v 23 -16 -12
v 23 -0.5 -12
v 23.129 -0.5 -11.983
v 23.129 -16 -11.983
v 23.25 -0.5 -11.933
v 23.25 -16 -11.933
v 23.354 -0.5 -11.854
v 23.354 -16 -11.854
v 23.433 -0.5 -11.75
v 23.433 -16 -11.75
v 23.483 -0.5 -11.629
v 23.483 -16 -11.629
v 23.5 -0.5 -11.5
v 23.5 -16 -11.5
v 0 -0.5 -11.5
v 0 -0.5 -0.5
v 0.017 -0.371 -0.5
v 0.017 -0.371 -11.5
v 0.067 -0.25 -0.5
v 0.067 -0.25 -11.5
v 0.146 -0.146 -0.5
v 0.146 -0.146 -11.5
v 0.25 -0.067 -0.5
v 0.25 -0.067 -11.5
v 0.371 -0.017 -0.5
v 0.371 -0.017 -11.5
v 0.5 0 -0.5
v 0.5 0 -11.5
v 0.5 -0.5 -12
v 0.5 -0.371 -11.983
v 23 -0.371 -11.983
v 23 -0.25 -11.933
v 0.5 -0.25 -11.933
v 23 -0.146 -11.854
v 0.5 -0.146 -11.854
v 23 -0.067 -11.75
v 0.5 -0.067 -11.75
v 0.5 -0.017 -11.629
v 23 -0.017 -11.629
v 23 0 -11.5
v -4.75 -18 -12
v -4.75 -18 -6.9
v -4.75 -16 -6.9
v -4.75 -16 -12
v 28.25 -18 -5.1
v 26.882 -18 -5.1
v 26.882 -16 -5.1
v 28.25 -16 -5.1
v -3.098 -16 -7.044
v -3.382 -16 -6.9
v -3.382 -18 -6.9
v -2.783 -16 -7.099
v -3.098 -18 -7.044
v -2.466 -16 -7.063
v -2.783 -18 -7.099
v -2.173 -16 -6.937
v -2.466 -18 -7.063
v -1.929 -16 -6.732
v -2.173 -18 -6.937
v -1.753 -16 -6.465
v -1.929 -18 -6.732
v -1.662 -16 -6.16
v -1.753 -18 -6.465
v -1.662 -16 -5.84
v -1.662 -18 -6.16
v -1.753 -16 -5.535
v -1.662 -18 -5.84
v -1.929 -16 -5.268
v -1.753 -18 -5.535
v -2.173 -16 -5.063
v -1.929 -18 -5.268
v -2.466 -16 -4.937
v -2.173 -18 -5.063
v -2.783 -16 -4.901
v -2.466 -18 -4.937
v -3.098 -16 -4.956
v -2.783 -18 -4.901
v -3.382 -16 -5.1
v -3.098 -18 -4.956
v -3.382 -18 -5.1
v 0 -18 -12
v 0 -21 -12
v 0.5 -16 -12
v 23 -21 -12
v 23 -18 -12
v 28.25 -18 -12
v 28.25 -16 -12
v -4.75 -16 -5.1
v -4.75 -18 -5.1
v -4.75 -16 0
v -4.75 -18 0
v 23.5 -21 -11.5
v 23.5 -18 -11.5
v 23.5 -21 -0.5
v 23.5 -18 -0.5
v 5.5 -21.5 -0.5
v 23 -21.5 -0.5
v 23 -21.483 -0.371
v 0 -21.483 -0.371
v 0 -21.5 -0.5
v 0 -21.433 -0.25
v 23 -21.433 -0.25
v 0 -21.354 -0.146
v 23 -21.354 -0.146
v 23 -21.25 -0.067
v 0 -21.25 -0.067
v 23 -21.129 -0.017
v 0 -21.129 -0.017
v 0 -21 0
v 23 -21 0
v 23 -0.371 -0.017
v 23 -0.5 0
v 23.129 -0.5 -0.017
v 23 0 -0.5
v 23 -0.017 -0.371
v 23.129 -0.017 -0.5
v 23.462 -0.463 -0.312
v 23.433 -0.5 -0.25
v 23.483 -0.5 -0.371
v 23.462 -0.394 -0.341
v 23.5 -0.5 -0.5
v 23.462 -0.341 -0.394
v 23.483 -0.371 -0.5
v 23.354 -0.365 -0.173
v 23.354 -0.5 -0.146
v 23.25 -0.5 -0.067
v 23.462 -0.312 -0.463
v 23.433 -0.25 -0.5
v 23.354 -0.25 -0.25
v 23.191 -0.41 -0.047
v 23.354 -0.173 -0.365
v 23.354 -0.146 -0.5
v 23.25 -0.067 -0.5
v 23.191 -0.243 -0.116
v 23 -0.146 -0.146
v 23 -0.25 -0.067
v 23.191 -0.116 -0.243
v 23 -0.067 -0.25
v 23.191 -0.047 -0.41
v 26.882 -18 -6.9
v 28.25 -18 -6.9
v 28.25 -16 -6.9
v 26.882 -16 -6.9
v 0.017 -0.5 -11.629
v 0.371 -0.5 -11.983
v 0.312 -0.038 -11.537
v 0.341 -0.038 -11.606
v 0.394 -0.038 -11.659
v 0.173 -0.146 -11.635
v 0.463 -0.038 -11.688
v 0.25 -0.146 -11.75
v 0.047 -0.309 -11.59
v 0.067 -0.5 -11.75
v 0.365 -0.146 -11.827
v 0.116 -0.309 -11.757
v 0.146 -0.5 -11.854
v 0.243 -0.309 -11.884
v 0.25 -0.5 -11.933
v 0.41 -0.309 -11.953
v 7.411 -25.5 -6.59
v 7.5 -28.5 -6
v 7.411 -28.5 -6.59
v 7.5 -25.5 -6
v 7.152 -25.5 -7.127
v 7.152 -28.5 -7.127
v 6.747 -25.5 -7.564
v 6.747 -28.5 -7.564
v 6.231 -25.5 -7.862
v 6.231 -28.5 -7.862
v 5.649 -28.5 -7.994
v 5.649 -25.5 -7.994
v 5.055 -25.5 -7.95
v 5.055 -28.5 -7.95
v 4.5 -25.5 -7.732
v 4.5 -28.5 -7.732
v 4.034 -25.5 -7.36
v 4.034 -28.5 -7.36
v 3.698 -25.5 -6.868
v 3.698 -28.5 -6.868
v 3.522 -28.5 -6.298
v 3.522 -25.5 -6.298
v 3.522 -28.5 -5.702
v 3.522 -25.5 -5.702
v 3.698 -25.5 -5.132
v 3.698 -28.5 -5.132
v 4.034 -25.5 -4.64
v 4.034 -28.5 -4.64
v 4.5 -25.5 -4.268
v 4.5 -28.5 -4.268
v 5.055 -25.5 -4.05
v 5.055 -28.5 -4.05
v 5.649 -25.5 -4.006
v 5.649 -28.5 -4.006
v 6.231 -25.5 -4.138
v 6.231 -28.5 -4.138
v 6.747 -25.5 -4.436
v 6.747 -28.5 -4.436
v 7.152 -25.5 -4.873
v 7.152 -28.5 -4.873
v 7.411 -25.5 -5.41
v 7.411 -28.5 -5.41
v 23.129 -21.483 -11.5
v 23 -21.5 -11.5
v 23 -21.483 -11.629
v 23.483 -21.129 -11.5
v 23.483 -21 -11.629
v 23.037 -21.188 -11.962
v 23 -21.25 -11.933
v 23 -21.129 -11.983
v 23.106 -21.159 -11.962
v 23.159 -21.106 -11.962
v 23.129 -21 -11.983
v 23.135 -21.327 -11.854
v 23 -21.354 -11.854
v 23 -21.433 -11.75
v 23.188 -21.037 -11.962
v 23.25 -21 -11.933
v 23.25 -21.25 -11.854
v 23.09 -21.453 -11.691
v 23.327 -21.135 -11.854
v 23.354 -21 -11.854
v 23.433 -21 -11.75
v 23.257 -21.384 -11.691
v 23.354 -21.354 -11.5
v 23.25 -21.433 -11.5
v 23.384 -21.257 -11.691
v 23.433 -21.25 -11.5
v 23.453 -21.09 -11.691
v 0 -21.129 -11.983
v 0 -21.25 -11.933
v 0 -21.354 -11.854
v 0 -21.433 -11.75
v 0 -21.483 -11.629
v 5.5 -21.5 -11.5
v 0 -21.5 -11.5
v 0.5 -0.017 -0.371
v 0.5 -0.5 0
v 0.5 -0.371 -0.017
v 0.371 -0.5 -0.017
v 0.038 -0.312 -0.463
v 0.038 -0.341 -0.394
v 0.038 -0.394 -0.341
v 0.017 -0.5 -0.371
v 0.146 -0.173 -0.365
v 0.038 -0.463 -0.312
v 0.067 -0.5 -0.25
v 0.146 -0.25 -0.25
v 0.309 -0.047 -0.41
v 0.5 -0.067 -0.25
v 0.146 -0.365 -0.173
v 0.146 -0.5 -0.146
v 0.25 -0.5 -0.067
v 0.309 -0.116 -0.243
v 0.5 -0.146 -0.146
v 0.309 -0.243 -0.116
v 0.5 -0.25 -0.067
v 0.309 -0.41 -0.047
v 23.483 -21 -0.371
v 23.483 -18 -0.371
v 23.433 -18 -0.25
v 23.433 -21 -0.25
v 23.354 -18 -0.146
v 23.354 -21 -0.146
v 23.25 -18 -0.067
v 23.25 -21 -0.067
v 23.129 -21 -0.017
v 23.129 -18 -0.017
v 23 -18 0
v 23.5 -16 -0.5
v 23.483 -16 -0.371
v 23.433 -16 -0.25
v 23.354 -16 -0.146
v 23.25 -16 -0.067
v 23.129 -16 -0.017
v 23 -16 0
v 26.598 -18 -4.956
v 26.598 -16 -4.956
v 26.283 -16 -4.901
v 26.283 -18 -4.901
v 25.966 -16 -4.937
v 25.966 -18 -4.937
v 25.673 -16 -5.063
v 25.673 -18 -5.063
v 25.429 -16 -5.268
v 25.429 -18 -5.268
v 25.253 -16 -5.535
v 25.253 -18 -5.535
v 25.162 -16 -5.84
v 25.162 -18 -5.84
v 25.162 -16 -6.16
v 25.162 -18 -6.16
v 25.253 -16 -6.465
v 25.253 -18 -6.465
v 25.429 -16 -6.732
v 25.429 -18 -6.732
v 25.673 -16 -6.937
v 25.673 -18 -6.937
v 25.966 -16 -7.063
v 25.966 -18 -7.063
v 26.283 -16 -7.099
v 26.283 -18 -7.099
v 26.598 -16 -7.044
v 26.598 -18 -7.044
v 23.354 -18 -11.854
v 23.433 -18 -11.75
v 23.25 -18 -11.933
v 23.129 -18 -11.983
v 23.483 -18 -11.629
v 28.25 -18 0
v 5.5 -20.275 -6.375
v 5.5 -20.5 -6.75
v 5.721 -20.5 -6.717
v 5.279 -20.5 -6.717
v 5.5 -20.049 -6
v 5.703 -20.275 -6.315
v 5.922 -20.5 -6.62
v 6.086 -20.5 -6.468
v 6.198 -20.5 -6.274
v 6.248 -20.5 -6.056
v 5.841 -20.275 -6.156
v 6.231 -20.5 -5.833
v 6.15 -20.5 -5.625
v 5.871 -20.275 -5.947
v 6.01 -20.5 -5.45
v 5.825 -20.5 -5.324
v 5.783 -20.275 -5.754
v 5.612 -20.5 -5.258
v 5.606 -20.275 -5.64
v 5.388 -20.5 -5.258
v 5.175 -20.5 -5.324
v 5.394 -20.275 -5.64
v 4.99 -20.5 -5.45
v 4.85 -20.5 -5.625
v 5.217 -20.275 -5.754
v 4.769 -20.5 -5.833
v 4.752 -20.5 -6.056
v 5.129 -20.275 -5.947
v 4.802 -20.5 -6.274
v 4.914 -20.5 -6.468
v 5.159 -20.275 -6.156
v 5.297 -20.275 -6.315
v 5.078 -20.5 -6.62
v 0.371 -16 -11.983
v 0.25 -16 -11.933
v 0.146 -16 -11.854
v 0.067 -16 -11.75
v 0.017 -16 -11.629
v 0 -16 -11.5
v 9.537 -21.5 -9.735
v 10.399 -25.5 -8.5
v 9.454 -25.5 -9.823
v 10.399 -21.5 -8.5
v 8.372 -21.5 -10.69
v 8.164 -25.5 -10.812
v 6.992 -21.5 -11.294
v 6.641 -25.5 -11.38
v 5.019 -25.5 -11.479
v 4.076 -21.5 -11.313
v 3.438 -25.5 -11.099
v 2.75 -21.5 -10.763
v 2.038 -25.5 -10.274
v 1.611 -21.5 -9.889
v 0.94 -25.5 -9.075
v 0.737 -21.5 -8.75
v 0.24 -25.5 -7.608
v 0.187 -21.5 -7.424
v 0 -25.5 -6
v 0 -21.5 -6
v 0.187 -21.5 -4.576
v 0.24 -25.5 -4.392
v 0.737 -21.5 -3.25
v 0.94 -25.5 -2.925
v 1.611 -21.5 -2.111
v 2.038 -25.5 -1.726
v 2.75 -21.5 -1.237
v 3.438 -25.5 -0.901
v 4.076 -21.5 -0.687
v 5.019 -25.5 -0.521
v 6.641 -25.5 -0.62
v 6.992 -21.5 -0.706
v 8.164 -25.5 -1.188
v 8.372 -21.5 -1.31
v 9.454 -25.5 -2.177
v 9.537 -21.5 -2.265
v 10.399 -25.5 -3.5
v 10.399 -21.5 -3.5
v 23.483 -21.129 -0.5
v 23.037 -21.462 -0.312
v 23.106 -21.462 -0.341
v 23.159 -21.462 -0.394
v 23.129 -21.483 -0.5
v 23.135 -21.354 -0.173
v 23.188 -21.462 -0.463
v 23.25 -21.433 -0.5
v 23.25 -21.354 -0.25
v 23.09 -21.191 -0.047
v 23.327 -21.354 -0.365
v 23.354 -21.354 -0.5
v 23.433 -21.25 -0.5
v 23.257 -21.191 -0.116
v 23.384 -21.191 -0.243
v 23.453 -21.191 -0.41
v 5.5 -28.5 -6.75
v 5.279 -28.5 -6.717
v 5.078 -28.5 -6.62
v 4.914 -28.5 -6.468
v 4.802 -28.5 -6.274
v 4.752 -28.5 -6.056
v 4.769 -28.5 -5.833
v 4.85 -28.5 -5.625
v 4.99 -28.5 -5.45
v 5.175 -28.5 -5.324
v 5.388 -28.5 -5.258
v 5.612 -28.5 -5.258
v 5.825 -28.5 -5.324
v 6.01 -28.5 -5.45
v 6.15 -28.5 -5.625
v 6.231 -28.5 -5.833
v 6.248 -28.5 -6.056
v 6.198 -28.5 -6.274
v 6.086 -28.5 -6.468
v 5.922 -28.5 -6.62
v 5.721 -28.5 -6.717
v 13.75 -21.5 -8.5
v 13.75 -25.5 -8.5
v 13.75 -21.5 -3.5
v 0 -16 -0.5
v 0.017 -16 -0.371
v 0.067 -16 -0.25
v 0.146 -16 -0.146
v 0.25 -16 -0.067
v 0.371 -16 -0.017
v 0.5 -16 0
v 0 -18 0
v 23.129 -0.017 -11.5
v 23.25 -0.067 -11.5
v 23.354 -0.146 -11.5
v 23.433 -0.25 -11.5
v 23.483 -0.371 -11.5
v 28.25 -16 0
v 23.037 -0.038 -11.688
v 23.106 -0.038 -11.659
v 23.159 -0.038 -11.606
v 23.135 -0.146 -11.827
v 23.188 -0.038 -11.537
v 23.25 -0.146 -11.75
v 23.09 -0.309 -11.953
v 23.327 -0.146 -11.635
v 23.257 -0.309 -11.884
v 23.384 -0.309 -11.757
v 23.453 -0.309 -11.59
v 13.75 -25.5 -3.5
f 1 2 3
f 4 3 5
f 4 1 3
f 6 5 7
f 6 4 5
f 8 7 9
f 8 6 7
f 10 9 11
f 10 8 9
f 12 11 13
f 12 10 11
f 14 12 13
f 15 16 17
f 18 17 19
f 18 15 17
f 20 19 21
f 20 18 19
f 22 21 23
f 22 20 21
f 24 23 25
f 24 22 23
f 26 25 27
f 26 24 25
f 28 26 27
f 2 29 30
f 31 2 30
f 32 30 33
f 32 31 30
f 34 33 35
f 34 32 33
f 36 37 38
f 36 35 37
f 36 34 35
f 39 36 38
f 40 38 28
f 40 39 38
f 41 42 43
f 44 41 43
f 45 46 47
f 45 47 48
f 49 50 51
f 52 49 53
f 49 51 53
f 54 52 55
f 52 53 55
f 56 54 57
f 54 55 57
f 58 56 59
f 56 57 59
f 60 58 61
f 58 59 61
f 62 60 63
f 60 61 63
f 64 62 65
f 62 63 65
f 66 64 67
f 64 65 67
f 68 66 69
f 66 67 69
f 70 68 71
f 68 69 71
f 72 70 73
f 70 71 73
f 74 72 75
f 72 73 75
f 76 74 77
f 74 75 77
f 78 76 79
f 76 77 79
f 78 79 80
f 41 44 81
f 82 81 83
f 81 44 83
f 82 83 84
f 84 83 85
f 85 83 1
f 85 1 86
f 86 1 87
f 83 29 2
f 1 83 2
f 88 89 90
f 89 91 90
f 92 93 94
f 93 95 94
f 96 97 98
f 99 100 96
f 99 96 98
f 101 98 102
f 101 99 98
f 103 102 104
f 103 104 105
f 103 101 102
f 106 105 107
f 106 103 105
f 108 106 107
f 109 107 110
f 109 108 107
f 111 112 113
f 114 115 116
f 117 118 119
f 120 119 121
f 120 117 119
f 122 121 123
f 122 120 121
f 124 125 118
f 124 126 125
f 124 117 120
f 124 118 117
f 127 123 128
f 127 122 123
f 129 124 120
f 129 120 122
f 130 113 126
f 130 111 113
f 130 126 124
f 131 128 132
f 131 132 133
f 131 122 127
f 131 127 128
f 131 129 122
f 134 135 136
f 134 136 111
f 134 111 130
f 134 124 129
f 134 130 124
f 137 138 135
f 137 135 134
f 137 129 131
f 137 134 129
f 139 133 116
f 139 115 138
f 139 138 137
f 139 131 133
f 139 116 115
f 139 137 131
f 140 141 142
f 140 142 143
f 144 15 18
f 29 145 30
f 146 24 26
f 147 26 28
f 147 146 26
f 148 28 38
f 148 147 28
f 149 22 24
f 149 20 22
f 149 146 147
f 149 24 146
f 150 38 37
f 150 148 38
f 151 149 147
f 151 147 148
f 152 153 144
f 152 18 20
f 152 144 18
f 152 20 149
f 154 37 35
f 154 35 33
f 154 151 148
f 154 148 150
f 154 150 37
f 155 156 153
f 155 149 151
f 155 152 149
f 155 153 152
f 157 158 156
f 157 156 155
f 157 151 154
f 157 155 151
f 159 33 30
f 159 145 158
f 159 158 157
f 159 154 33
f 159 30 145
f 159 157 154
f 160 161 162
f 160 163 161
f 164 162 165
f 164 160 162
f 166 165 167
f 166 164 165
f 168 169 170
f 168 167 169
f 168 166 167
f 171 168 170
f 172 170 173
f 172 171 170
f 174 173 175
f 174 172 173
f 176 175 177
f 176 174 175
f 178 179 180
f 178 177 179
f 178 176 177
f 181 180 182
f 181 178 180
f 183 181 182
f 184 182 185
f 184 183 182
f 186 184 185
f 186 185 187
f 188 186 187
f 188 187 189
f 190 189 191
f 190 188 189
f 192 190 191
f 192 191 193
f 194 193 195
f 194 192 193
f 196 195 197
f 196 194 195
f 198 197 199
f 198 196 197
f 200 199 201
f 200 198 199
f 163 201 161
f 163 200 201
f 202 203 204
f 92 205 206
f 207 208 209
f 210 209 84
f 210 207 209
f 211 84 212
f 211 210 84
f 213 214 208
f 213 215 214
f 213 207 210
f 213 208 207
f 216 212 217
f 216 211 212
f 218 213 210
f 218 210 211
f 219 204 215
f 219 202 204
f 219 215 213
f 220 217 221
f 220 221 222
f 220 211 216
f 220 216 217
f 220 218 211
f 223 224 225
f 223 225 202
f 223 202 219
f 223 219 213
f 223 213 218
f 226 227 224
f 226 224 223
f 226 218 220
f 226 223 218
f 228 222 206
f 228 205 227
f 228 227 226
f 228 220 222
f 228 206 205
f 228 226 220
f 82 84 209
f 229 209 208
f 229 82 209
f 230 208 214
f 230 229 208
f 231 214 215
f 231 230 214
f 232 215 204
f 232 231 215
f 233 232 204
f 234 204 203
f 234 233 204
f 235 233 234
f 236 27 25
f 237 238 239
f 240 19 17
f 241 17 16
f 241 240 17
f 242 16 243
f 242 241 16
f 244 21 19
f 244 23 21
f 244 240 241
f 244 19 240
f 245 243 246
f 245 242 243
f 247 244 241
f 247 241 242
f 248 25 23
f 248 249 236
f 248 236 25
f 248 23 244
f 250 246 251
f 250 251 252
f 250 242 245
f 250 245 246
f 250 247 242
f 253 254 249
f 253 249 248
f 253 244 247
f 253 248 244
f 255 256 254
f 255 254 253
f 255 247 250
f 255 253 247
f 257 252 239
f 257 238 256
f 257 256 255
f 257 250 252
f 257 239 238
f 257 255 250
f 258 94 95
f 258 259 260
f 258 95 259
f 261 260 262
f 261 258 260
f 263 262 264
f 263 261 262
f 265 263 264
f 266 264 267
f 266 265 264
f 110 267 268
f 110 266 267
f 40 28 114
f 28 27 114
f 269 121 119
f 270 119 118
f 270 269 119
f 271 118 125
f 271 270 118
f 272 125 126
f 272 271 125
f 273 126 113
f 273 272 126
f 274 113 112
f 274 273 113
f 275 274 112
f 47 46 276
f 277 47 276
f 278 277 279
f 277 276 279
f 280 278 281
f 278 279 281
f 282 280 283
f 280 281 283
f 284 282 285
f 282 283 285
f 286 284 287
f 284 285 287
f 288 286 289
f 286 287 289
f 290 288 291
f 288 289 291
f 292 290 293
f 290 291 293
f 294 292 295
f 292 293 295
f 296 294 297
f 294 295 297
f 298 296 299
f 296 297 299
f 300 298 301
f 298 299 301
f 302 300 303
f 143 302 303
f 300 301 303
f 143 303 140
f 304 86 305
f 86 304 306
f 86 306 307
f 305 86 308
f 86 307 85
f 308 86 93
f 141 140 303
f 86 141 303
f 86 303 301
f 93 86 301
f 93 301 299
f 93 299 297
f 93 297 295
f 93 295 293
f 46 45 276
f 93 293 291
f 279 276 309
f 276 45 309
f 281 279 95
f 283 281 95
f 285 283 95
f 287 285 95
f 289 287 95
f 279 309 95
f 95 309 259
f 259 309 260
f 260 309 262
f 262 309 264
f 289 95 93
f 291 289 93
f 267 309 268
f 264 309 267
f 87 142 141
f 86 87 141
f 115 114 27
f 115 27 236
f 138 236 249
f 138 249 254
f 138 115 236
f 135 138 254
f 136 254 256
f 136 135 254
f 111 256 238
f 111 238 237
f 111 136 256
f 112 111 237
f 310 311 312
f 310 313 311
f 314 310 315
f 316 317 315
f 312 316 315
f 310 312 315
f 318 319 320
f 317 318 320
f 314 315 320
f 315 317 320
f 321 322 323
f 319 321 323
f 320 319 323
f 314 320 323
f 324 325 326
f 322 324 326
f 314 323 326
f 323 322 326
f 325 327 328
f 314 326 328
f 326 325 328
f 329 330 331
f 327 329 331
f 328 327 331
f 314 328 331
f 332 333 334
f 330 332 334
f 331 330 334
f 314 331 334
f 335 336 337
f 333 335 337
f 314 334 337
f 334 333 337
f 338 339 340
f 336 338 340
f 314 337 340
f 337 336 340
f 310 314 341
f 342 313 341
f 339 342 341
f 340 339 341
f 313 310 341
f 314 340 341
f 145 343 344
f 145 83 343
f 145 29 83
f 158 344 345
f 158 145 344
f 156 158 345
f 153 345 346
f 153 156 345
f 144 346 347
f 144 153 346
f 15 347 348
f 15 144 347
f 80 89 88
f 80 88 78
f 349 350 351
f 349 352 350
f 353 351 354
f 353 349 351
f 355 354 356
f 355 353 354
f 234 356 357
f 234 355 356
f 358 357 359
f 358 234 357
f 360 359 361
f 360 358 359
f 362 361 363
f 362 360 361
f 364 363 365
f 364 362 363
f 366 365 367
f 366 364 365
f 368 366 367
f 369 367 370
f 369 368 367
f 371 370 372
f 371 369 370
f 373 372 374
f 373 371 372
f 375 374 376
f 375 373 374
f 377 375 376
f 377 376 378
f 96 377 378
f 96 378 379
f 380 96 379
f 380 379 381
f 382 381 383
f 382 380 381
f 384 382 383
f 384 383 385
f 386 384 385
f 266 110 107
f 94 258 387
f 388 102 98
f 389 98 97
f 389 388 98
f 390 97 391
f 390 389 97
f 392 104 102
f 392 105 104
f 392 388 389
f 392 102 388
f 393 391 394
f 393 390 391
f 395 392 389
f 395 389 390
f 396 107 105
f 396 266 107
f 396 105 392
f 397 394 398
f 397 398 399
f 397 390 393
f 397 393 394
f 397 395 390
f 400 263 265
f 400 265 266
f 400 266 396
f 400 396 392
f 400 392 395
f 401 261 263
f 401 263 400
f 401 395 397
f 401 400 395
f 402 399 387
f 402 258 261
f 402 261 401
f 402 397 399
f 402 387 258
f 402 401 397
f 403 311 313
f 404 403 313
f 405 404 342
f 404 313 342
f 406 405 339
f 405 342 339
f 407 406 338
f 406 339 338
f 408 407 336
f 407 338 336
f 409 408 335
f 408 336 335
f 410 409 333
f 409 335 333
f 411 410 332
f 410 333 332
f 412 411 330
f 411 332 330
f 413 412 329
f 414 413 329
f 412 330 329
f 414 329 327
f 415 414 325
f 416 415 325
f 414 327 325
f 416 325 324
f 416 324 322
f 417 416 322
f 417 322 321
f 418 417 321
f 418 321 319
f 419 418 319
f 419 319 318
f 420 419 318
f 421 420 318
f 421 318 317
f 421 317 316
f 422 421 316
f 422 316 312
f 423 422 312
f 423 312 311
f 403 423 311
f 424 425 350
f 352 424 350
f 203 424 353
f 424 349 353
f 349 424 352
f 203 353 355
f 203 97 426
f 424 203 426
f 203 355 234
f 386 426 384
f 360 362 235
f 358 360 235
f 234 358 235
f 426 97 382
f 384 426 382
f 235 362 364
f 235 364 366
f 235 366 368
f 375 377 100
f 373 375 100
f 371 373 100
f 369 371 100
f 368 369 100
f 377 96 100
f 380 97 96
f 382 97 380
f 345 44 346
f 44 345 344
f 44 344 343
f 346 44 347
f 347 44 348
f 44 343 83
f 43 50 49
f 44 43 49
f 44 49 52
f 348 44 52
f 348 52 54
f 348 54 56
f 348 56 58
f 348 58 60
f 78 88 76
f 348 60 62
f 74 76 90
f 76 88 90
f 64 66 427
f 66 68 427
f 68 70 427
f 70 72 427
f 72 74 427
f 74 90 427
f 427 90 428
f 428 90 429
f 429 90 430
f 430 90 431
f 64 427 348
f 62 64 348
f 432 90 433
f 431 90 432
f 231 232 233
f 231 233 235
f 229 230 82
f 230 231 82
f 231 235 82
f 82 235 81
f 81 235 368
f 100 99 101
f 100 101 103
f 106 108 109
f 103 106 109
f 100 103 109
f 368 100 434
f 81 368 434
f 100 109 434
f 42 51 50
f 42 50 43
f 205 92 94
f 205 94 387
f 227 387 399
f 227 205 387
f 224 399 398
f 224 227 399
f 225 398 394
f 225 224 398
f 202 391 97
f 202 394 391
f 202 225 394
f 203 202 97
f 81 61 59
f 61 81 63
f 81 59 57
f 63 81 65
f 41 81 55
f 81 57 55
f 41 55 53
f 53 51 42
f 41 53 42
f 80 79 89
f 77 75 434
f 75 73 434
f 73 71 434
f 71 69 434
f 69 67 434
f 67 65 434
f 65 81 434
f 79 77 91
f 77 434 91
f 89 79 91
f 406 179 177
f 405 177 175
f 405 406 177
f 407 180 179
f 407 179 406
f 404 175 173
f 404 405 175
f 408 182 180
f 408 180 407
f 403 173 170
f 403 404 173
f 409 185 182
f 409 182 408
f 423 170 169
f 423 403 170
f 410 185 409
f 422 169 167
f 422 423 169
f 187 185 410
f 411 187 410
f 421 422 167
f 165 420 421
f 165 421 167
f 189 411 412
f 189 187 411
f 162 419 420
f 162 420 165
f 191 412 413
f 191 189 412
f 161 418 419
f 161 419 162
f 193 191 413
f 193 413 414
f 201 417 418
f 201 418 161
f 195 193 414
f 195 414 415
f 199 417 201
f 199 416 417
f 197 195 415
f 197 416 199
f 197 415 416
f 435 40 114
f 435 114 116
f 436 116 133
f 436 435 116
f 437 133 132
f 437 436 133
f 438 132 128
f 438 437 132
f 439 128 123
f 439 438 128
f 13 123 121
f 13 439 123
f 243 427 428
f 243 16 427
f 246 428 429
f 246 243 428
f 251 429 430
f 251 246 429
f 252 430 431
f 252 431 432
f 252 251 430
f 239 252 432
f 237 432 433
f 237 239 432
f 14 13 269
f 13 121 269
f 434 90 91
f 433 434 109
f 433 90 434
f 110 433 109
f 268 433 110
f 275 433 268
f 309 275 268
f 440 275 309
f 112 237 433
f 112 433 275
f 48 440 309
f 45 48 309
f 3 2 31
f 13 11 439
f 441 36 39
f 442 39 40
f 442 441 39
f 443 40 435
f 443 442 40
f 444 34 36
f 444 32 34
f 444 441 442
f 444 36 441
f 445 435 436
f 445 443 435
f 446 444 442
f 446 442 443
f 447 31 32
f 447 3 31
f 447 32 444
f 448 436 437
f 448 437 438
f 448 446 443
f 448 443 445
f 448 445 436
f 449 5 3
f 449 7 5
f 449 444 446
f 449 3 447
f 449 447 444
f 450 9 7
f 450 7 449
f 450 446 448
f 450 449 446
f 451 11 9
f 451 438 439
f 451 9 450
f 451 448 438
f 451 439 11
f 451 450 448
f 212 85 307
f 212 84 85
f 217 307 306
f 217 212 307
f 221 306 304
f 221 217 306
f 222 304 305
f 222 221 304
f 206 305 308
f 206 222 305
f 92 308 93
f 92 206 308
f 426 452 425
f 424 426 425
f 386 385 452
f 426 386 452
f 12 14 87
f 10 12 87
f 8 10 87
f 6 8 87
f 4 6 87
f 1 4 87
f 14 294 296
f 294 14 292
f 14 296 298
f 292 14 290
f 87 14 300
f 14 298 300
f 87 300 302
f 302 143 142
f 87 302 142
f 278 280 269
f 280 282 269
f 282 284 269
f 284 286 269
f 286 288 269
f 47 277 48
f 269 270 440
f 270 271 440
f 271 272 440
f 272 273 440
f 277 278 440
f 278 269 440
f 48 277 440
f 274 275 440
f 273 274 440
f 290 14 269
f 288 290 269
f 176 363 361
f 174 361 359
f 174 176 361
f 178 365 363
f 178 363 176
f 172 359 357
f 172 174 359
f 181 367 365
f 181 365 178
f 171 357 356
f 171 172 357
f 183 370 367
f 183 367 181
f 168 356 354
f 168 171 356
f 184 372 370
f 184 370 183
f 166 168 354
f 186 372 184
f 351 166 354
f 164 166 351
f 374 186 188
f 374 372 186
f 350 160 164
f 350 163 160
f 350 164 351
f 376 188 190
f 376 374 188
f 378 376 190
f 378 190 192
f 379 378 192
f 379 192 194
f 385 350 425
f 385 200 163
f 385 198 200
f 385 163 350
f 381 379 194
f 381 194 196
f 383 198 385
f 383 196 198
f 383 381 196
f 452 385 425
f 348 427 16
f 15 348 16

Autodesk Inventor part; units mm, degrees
ref_plane "YZ Plane" through (0, 0, 0) normal (1, 0, 0) x (0, 1, 0)
ref_plane "XZ Plane" through (0, 0, 0) normal (0, 1, 0) x (-1, 0, 0)
ref_plane "XY Plane" through (0, 0, 0) normal (0, 0, 1) x (1, 0, 0)
sketch "Sketch1" plane through (0, 0, 0) normal (0, 0, 1) x (1, 0, 0)
  line L0 (0, 0) -> (23.5, 0)
  line L1 (23.5, 0) -> (23.5, -21.5)
  line L2 (23.5, -21.5) -> (0, -21.5)
  line L3 (0, -21.5) -> (0, 0)
  dimension "d0" = 23.5
  dimension "d1" = 21.5
extrude "Extrusion1" add sketch "Sketch1" against normal blind 12
sketch "Sketch2" plane through (0, 0, 0) normal (0, 0, 1) x (1, 0, 0)
  line L0 (0, 0) -> (23.5, 0) projected
  line L1 (0, -21.5) -> (0, 0) projected
  line L2 (23.5, 0) -> (23.5, -21.5) projected
  line L3 (-4.75, -16) -> (28.25, -16)
  line L4 (28.25, -16) -> (28.25, -18)
  line L5 (28.25, -18) -> (-4.75, -18)
  line L6 (-4.75, -18) -> (-4.75, -16)
  dimension "d4" = 16
  dimension "d5" = 4.75
  dimension "d6" = 4.75
  dimension "d7" = 2
extrude "Extrusion2" add sketch "Sketch2" against normal blind 12 contours L3 L2 L5 L1 | L1 L5 L6 L3 | L3 L4 L5 L2
sketch "Sketch3" plane through (0, -21.5, 0) normal (0, -1, 0) x (1, 0, 0)
  line L0 (0, 0) -> (0, -12) projected
  circle A0 centre (5.5, -6) radius 5.5
  dimension "d10" = 5.5
  dimension "d11" = 11
extrude "Extrusion3" add sketch "Sketch3" along normal blind 4
sketch "Sketch4" plane through (5.5, -25.5, -6) normal (0, -1, 0) x (1, 0, 0)
  circle A0 centre (0, 0) radius 5.5 projected
  line L0 (4.8288, 2.5) -> (8.25, 2.5)
  line L1 (8.25, 2.5) -> (8.25, -2.5)
  line L2 (8.25, -2.5) -> (4.8288, -2.5)
  line L3 (4.8288, -2.5) -> (4.8288, 2.5)
  point P0 (-5.5, 6)
  point P1 (8.25, 0)
  dimension "d15" = 5
  dimension "d17" = 8.25
extrude "Extrusion4" add sketch "Sketch4" against normal blind 4 contours A0 L2 L3 L0 | A0 L0 L1 L2 picked at (4.9626, -0.5673)
sketch "Sketch5" plane through (0, -25.5, 0) normal (0, -1, 0) x (1, 0, 0)
  arc A0 (10.399, -3.5) -> (10.399, -8.5) centre (5.5, -6) ccw projected
  circle A1 centre (5.5, -6) radius 2
  point P0 (0, 0)
  dimension "d20" = 4
extrude "Extrusion5" add sketch "Sketch5" along normal blind 3
sketch "Sketch6" plane through (-4.75, -18, 0) normal (0, -1, 0) x (1, 0, 0)
  line L0 (4.75, 0) -> (4.75, -12) projected
  line L1 (0, 0) -> (0, -12) projected
  line L2 (28.25, -12) -> (28.25, 0) projected
  line L3 (33, -12) -> (28.25, -12) projected
  line L4 (33, 0) -> (33, -12) projected
  line L5 (33, 0) -> (28.25, 0) projected
  circle A0 centre (2, -6) radius 1.1
  circle A1 centre (31, -6) radius 1.1
  line L6 (-3.3152, -5.1) -> (1.5271, -5.1)
  line L7 (1.5271, -5.1) -> (1.5271, -6.9)
  line L8 (1.5271, -6.9) -> (-3.3152, -6.9)
  line L9 (-3.3152, -6.9) -> (-3.3152, -5.1)
  line L10 (31.5226, -5.1) -> (37.6277, -5.1)
  line L11 (37.6277, -5.1) -> (37.6277, -6.9)
  line L12 (37.6277, -6.9) -> (31.5226, -6.9)
  line L13 (31.5226, -6.9) -> (31.5226, -5.1)
  point P0 (4.75, -6)
  point P1 (1.5271, -6)
  point P2 (28.25, -6)
  point P3 (31.5226, -6)
  dimension "d24" = 2.2
  dimension "d26" = 2
  dimension "d27" = 2
  dimension "d28" = 2.2
  dimension "d29" = 1.8
  dimension "d30" = 1.8
extrude "Extrusion6" cut sketch "Sketch6" against normal through all contours L6 A0 L8 L1 | L1 L8 L9 L6 | L6 L7 L8 A0 | A0 L8 L7 L6 | L12 A1 L10 L4 | L4 L10 L11 L12 | L12 L13 L10 A1 | A1 L10 L13 L12
fillet "Fillet1" radius 0.5 13 edges at (0, -8, -12) (23.5, -8, -12) (11.75, 0, -12) (11.75, 0, 0) (0, 0, -6) (23.5, 0, -6) (0, -8, 0) (23.5, -8, 0) (23.5, -19.75, 0) (23.5, -21.5, -6) (23.5, -19.75, -12) (11.75, -21.5, -12) (11.75, -21.5, 0)
sketch "Sketch7" plane through (5.5, -28.5, -6) normal (0, -1, 0) x (1, 0, 0)
  circle A0 centre (0, 0) radius 2 projected
  point P0 (-5.5, 6)
hole "Hole1" at (5.5, -28.5, -6) direction (0, 1, 0) diameter 1.5 depth 8 tip angle 118
equation "\"d6\" = d5"
properties part number "Servo Motor"
